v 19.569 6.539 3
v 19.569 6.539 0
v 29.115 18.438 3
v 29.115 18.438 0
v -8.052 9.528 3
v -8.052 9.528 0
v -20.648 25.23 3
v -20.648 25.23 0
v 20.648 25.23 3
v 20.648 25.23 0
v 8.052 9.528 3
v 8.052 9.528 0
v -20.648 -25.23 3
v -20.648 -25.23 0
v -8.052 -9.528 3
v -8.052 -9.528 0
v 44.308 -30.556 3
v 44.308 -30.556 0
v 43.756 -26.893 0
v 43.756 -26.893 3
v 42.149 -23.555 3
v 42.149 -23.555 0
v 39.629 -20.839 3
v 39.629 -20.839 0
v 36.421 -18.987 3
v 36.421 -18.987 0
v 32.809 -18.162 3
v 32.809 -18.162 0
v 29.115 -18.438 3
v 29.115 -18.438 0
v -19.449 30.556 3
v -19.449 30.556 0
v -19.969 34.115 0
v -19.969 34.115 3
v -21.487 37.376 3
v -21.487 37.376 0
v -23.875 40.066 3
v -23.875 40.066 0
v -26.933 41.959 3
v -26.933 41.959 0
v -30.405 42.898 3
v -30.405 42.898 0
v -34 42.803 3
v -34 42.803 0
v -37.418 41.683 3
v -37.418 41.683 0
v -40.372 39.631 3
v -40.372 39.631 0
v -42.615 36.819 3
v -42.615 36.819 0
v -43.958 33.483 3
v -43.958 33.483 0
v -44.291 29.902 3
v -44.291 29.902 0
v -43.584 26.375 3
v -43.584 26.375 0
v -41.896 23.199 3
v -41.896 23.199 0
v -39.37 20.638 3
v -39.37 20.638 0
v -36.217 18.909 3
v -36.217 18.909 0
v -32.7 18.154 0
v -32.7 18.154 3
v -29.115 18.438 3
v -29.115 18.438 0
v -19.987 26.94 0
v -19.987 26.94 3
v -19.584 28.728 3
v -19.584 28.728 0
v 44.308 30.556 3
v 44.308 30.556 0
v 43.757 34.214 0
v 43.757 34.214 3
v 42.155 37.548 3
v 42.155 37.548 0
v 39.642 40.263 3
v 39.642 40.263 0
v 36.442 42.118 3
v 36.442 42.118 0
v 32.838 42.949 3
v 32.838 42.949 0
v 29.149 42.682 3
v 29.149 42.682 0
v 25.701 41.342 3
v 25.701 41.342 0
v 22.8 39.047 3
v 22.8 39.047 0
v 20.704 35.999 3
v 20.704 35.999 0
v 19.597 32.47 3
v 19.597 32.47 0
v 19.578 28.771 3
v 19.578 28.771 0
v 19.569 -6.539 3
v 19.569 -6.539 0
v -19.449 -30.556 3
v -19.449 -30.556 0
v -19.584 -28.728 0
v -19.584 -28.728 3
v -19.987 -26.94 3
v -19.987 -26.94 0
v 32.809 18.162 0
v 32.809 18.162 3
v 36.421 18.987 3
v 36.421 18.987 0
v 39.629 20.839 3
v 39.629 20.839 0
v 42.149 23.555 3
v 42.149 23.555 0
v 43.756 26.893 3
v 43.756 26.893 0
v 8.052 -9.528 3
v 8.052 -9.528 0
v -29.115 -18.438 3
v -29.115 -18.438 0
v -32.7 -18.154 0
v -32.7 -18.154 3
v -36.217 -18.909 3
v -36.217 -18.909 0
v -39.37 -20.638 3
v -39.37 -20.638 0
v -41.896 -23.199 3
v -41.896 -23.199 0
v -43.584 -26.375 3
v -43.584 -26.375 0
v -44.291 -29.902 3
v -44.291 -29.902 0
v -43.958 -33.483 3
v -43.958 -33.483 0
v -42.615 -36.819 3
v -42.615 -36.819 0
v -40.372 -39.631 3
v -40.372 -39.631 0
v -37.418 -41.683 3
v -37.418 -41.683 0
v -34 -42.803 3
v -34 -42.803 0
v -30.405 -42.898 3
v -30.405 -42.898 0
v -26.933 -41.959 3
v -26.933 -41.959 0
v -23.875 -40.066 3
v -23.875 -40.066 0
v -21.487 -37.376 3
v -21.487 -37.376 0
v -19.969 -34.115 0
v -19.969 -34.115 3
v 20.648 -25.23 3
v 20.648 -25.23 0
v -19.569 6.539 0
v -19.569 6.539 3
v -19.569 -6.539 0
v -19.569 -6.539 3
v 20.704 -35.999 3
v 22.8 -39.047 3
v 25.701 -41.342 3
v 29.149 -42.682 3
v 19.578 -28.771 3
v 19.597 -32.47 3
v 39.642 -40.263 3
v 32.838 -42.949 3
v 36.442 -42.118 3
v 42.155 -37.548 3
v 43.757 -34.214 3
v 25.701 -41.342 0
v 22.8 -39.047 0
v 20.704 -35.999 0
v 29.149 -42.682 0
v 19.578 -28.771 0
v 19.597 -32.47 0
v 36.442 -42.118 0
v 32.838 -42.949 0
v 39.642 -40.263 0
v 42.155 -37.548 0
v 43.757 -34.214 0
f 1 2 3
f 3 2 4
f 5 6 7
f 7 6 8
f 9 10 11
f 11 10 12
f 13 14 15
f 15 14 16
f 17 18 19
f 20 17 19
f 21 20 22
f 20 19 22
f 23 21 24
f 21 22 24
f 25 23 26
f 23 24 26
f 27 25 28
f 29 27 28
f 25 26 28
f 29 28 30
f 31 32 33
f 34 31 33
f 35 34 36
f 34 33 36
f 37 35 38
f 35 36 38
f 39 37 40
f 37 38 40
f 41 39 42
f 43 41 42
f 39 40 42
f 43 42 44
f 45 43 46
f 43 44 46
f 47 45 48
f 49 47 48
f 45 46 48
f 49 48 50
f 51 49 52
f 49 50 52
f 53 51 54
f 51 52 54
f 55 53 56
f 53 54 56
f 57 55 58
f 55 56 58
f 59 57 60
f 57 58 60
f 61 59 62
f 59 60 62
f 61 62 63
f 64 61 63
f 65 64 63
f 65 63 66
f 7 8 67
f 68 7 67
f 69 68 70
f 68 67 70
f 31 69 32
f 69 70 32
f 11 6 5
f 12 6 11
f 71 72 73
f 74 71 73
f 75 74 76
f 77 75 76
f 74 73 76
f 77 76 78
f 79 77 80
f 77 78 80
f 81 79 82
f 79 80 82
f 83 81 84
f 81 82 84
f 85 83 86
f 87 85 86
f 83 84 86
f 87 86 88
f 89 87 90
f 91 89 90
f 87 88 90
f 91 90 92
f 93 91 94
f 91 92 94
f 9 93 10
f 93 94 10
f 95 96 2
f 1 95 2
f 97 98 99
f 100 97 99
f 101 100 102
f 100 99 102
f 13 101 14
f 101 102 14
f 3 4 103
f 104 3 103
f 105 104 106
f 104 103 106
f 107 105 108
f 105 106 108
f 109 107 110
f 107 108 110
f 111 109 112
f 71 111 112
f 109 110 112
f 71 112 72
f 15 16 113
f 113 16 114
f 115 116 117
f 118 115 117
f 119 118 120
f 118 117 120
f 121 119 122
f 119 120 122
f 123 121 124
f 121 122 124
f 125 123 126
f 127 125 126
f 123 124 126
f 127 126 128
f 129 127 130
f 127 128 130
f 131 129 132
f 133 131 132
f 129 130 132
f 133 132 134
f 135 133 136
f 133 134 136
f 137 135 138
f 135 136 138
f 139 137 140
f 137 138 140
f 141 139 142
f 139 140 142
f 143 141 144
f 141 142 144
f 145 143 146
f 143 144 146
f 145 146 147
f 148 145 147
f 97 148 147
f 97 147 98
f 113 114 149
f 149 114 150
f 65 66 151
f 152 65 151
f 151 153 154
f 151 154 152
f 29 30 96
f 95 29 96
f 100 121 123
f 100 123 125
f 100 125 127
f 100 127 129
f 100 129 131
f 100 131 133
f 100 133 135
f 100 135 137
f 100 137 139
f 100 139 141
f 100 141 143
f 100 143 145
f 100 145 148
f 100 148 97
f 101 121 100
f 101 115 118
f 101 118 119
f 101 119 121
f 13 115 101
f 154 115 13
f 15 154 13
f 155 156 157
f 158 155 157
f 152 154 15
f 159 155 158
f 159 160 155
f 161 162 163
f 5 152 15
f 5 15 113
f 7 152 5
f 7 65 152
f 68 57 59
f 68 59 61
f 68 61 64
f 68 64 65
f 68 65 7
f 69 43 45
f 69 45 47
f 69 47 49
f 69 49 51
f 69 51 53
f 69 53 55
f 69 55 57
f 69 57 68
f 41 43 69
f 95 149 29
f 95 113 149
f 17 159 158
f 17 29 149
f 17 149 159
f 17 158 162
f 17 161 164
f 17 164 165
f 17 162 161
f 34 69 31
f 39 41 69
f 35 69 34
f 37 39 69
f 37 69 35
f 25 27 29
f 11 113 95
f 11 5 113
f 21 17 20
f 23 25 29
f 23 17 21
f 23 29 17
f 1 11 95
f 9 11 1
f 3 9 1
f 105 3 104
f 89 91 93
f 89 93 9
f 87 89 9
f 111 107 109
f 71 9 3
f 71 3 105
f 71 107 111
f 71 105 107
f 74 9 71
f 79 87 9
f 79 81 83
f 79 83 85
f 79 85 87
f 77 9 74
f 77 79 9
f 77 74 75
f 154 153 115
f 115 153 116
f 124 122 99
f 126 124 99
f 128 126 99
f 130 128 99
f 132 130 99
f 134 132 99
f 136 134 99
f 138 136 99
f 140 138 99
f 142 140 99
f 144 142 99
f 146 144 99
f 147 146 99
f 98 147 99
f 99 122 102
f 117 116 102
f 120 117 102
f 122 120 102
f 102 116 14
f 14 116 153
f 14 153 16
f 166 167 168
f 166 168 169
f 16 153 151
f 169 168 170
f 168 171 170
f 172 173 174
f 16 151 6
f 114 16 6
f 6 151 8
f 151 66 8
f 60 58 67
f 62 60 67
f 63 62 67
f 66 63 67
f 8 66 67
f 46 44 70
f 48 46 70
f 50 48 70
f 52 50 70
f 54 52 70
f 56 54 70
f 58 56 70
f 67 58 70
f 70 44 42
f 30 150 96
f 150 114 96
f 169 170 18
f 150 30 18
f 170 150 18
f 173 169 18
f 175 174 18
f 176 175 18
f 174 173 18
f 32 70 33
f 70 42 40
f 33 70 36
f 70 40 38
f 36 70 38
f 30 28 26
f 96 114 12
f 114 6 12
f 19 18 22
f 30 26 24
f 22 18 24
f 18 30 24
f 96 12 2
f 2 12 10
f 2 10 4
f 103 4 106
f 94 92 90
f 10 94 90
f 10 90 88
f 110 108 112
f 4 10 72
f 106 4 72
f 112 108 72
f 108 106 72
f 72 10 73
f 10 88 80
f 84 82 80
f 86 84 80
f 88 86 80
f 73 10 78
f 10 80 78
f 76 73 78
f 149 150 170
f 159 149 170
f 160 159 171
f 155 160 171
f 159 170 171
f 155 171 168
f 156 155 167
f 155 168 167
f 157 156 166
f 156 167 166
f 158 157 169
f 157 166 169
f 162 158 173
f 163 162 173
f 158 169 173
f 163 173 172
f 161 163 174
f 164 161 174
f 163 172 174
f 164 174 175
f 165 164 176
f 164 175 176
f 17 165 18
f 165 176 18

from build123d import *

# Parameters (mm, degrees)
F0_W     = 11.5173384978
F0_H     = 13.0775373821
F0_W_2   = 16.1038693041
F0_H_2   = 2.9893541513
F1_DEPTH = 3


with BuildPart() as f1:
    # F0 (on Top) → F1 (new body)
    with BuildSketch(Plane.XY):
        with BuildLine():
            Line((-27.644963935, 33.9523106813), (-20.6479323776, 25.2299834391))
            ThreePointArc((-20.6479323776, 25.2299834391), (-19.752349447, 27.8264836408), (-19.4488823526, 30.5562803009))
            ThreePointArc((-19.4488823526, 30.5562803009), (-41.5954351034, 38.3068214365), (-29.1147480721, 18.4379226783))
            Line((-29.1147480721, 18.4379226783), (-36.1117796295, 27.1602499205))
            Line((-36.1117796295, 27.1602499205), (-27.644963935, 33.9523106813))
        make_face()
        with BuildLine():
            ThreePointArc((-29.1147480721, 18.4379226783), (-24.1007453474, 20.8608827061), (-20.6479323776, 25.2299834391))
            Line((-20.6479323776, 25.2299834391), (-27.644963935, 33.9523106813))
            Line((-27.644963935, 33.9523106813), (-36.1117796295, 27.1602499205))
            Line((-36.1117796295, 27.1602499205), (-29.1147480721, 18.4379226783))
        make_face()
        with BuildLine():
            Line((-19.5692731498, 6.5387686911), (-8.051934652, 9.5281228423))
            Line((-8.051934652, 9.5281228423), (-20.6479323776, 25.2299834391))
            ThreePointArc((-20.6479323776, 25.2299834391), (-24.1007453474, 20.8608827061), (-29.1147480721, 18.4379226783))
            Line((-29.1147480721, 18.4379226783), (-19.5692731498, 6.5387686911))
        make_face()
        with BuildLine():
            ThreePointArc((44.3078612119, 30.5562803009), (29.1485751221, 42.6823026363), (20.6479323776, 25.2299834391))
            Line((20.6479323776, 25.2299834391), (27.644963935, 33.9523106813))
            Line((27.644963935, 33.9523106813), (36.1117796295, 27.1602499205))
            Line((36.1117796295, 27.1602499205), (29.1147480721, 18.4379226783))
            ThreePointArc((29.1147480721, 18.4379226783), (39.6289129179, 20.8392169798), (44.3078612119, 30.5562803009))
        make_face()
        with BuildLine():
            Line((27.644963935, 33.9523106813), (20.6479323776, 25.2299834391))
            ThreePointArc((20.6479323776, 25.2299834391), (24.1007453474, 20.8608827061), (29.1147480721, 18.4379226783))
            Line((29.1147480721, 18.4379226783), (36.1117796295, 27.1602499205))
            Line((36.1117796295, 27.1602499205), (27.644963935, 33.9523106813))
        make_face()
        with BuildLine():
            Line((20.6479323776, 25.2299834391), (8.051934652, 9.5281228423))
            Line((8.051934652, 9.5281228423), (19.5692731498, 6.5387686911))
            Line((19.5692731498, 6.5387686911), (29.1147480721, 18.4379226783))
            ThreePointArc((29.1147480721, 18.4379226783), (24.1007453474, 20.8608827061), (20.6479323776, 25.2299834391))
        make_face()
        with BuildLine():
            ThreePointArc((44.3078612119, -30.5562803009), (39.6289129179, -20.8392169798), (29.1147480721, -18.4379226783))
            Line((29.1147480721, -18.4379226783), (36.1117796295, -27.1602499205))
            Line((36.1117796295, -27.1602499205), (27.644963935, -33.9523106813))
            Line((27.644963935, -33.9523106813), (20.6479323776, -25.2299834391))
            ThreePointArc((20.6479323776, -25.2299834391), (29.1485751221, -42.6823026363), (44.3078612119, -30.5562803009))
        make_face()
        with BuildLine():
            Line((36.1117796295, -27.1602499205), (29.1147480721, -18.4379226783))
            ThreePointArc((29.1147480721, -18.4379226783), (24.1007453474, -20.8608827061), (20.6479323776, -25.2299834391))
            Line((20.6479323776, -25.2299834391), (27.644963935, -33.9523106813))
            Line((27.644963935, -33.9523106813), (36.1117796295, -27.1602499205))
        make_face()
        with BuildLine():
            Line((29.1147480721, -18.4379226783), (19.5692731498, -6.5387686911))
            Line((19.5692731498, -6.5387686911), (8.051934652, -9.5281228423))
            Line((8.051934652, -9.5281228423), (20.6479323776, -25.2299834391))
            ThreePointArc((20.6479323776, -25.2299834391), (24.1007453474, -20.8608827061), (29.1147480721, -18.4379226783))
        make_face()
        with BuildLine():
            Line((-36.1117796295, -27.1602499205), (-29.1147480721, -18.4379226783))
            ThreePointArc((-29.1147480721, -18.4379226783), (-41.5954351034, -38.3068214365), (-19.4488823526, -30.5562803009))
            ThreePointArc((-19.4488823526, -30.5562803009), (-19.752349447, -27.8264836408), (-20.6479323776, -25.2299834391))
            Line((-20.6479323776, -25.2299834391), (-27.644963935, -33.9523106813))
            Line((-27.644963935, -33.9523106813), (-36.1117796295, -27.1602499205))
        make_face()
        with BuildLine():
            ThreePointArc((-20.6479323776, -25.2299834391), (-24.1007453474, -20.8608827061), (-29.1147480721, -18.4379226783))
            Line((-29.1147480721, -18.4379226783), (-36.1117796295, -27.1602499205))
            Line((-36.1117796295, -27.1602499205), (-27.644963935, -33.9523106813))
            Line((-27.644963935, -33.9523106813), (-20.6479323776, -25.2299834391))
        make_face()
        with BuildLine():
            Line((-8.051934652, -9.5281228423), (-19.5692731498, -6.5387686911))
            Line((-19.5692731498, -6.5387686911), (-29.1147480721, -18.4379226783))
            ThreePointArc((-29.1147480721, -18.4379226783), (-24.1007453474, -20.8608827061), (-20.6479323776, -25.2299834391))
            Line((-20.6479323776, -25.2299834391), (-8.051934652, -9.5281228423))
        make_face()
        with Locations((-13.8106039009, 0)):
            Rectangle(F0_W, F0_H)
        Rectangle(F0_W_2, F0_H)
        with Locations((13.8106039009, 0)):
            Rectangle(F0_W, F0_H)
        with Locations((0, -8.0334457667)):
            Rectangle(F0_W_2, F0_H_2)
        with Locations((0, 8.0334457667)):
            Rectangle(F0_W_2, F0_H_2)
        Polygon((-8.051934652, 6.5387686911), (-8.051934652, 9.5281228423), (-19.5692731498, 6.5387686911), align=None)
        Polygon((-8.051934652, -6.5387686911), (-19.5692731498, -6.5387686911), (-8.051934652, -9.5281228423), align=None)
        Polygon((8.051934652, -9.5281228423), (19.5692731498, -6.5387686911), (8.051934652, -6.5387686911), align=None)
        Polygon((19.5692731498, 6.5387686911), (8.051934652, 9.5281228423), (8.051934652, 6.5387686911), align=None)
    extrude(amount=F1_DEPTH)


solid = f1.part
